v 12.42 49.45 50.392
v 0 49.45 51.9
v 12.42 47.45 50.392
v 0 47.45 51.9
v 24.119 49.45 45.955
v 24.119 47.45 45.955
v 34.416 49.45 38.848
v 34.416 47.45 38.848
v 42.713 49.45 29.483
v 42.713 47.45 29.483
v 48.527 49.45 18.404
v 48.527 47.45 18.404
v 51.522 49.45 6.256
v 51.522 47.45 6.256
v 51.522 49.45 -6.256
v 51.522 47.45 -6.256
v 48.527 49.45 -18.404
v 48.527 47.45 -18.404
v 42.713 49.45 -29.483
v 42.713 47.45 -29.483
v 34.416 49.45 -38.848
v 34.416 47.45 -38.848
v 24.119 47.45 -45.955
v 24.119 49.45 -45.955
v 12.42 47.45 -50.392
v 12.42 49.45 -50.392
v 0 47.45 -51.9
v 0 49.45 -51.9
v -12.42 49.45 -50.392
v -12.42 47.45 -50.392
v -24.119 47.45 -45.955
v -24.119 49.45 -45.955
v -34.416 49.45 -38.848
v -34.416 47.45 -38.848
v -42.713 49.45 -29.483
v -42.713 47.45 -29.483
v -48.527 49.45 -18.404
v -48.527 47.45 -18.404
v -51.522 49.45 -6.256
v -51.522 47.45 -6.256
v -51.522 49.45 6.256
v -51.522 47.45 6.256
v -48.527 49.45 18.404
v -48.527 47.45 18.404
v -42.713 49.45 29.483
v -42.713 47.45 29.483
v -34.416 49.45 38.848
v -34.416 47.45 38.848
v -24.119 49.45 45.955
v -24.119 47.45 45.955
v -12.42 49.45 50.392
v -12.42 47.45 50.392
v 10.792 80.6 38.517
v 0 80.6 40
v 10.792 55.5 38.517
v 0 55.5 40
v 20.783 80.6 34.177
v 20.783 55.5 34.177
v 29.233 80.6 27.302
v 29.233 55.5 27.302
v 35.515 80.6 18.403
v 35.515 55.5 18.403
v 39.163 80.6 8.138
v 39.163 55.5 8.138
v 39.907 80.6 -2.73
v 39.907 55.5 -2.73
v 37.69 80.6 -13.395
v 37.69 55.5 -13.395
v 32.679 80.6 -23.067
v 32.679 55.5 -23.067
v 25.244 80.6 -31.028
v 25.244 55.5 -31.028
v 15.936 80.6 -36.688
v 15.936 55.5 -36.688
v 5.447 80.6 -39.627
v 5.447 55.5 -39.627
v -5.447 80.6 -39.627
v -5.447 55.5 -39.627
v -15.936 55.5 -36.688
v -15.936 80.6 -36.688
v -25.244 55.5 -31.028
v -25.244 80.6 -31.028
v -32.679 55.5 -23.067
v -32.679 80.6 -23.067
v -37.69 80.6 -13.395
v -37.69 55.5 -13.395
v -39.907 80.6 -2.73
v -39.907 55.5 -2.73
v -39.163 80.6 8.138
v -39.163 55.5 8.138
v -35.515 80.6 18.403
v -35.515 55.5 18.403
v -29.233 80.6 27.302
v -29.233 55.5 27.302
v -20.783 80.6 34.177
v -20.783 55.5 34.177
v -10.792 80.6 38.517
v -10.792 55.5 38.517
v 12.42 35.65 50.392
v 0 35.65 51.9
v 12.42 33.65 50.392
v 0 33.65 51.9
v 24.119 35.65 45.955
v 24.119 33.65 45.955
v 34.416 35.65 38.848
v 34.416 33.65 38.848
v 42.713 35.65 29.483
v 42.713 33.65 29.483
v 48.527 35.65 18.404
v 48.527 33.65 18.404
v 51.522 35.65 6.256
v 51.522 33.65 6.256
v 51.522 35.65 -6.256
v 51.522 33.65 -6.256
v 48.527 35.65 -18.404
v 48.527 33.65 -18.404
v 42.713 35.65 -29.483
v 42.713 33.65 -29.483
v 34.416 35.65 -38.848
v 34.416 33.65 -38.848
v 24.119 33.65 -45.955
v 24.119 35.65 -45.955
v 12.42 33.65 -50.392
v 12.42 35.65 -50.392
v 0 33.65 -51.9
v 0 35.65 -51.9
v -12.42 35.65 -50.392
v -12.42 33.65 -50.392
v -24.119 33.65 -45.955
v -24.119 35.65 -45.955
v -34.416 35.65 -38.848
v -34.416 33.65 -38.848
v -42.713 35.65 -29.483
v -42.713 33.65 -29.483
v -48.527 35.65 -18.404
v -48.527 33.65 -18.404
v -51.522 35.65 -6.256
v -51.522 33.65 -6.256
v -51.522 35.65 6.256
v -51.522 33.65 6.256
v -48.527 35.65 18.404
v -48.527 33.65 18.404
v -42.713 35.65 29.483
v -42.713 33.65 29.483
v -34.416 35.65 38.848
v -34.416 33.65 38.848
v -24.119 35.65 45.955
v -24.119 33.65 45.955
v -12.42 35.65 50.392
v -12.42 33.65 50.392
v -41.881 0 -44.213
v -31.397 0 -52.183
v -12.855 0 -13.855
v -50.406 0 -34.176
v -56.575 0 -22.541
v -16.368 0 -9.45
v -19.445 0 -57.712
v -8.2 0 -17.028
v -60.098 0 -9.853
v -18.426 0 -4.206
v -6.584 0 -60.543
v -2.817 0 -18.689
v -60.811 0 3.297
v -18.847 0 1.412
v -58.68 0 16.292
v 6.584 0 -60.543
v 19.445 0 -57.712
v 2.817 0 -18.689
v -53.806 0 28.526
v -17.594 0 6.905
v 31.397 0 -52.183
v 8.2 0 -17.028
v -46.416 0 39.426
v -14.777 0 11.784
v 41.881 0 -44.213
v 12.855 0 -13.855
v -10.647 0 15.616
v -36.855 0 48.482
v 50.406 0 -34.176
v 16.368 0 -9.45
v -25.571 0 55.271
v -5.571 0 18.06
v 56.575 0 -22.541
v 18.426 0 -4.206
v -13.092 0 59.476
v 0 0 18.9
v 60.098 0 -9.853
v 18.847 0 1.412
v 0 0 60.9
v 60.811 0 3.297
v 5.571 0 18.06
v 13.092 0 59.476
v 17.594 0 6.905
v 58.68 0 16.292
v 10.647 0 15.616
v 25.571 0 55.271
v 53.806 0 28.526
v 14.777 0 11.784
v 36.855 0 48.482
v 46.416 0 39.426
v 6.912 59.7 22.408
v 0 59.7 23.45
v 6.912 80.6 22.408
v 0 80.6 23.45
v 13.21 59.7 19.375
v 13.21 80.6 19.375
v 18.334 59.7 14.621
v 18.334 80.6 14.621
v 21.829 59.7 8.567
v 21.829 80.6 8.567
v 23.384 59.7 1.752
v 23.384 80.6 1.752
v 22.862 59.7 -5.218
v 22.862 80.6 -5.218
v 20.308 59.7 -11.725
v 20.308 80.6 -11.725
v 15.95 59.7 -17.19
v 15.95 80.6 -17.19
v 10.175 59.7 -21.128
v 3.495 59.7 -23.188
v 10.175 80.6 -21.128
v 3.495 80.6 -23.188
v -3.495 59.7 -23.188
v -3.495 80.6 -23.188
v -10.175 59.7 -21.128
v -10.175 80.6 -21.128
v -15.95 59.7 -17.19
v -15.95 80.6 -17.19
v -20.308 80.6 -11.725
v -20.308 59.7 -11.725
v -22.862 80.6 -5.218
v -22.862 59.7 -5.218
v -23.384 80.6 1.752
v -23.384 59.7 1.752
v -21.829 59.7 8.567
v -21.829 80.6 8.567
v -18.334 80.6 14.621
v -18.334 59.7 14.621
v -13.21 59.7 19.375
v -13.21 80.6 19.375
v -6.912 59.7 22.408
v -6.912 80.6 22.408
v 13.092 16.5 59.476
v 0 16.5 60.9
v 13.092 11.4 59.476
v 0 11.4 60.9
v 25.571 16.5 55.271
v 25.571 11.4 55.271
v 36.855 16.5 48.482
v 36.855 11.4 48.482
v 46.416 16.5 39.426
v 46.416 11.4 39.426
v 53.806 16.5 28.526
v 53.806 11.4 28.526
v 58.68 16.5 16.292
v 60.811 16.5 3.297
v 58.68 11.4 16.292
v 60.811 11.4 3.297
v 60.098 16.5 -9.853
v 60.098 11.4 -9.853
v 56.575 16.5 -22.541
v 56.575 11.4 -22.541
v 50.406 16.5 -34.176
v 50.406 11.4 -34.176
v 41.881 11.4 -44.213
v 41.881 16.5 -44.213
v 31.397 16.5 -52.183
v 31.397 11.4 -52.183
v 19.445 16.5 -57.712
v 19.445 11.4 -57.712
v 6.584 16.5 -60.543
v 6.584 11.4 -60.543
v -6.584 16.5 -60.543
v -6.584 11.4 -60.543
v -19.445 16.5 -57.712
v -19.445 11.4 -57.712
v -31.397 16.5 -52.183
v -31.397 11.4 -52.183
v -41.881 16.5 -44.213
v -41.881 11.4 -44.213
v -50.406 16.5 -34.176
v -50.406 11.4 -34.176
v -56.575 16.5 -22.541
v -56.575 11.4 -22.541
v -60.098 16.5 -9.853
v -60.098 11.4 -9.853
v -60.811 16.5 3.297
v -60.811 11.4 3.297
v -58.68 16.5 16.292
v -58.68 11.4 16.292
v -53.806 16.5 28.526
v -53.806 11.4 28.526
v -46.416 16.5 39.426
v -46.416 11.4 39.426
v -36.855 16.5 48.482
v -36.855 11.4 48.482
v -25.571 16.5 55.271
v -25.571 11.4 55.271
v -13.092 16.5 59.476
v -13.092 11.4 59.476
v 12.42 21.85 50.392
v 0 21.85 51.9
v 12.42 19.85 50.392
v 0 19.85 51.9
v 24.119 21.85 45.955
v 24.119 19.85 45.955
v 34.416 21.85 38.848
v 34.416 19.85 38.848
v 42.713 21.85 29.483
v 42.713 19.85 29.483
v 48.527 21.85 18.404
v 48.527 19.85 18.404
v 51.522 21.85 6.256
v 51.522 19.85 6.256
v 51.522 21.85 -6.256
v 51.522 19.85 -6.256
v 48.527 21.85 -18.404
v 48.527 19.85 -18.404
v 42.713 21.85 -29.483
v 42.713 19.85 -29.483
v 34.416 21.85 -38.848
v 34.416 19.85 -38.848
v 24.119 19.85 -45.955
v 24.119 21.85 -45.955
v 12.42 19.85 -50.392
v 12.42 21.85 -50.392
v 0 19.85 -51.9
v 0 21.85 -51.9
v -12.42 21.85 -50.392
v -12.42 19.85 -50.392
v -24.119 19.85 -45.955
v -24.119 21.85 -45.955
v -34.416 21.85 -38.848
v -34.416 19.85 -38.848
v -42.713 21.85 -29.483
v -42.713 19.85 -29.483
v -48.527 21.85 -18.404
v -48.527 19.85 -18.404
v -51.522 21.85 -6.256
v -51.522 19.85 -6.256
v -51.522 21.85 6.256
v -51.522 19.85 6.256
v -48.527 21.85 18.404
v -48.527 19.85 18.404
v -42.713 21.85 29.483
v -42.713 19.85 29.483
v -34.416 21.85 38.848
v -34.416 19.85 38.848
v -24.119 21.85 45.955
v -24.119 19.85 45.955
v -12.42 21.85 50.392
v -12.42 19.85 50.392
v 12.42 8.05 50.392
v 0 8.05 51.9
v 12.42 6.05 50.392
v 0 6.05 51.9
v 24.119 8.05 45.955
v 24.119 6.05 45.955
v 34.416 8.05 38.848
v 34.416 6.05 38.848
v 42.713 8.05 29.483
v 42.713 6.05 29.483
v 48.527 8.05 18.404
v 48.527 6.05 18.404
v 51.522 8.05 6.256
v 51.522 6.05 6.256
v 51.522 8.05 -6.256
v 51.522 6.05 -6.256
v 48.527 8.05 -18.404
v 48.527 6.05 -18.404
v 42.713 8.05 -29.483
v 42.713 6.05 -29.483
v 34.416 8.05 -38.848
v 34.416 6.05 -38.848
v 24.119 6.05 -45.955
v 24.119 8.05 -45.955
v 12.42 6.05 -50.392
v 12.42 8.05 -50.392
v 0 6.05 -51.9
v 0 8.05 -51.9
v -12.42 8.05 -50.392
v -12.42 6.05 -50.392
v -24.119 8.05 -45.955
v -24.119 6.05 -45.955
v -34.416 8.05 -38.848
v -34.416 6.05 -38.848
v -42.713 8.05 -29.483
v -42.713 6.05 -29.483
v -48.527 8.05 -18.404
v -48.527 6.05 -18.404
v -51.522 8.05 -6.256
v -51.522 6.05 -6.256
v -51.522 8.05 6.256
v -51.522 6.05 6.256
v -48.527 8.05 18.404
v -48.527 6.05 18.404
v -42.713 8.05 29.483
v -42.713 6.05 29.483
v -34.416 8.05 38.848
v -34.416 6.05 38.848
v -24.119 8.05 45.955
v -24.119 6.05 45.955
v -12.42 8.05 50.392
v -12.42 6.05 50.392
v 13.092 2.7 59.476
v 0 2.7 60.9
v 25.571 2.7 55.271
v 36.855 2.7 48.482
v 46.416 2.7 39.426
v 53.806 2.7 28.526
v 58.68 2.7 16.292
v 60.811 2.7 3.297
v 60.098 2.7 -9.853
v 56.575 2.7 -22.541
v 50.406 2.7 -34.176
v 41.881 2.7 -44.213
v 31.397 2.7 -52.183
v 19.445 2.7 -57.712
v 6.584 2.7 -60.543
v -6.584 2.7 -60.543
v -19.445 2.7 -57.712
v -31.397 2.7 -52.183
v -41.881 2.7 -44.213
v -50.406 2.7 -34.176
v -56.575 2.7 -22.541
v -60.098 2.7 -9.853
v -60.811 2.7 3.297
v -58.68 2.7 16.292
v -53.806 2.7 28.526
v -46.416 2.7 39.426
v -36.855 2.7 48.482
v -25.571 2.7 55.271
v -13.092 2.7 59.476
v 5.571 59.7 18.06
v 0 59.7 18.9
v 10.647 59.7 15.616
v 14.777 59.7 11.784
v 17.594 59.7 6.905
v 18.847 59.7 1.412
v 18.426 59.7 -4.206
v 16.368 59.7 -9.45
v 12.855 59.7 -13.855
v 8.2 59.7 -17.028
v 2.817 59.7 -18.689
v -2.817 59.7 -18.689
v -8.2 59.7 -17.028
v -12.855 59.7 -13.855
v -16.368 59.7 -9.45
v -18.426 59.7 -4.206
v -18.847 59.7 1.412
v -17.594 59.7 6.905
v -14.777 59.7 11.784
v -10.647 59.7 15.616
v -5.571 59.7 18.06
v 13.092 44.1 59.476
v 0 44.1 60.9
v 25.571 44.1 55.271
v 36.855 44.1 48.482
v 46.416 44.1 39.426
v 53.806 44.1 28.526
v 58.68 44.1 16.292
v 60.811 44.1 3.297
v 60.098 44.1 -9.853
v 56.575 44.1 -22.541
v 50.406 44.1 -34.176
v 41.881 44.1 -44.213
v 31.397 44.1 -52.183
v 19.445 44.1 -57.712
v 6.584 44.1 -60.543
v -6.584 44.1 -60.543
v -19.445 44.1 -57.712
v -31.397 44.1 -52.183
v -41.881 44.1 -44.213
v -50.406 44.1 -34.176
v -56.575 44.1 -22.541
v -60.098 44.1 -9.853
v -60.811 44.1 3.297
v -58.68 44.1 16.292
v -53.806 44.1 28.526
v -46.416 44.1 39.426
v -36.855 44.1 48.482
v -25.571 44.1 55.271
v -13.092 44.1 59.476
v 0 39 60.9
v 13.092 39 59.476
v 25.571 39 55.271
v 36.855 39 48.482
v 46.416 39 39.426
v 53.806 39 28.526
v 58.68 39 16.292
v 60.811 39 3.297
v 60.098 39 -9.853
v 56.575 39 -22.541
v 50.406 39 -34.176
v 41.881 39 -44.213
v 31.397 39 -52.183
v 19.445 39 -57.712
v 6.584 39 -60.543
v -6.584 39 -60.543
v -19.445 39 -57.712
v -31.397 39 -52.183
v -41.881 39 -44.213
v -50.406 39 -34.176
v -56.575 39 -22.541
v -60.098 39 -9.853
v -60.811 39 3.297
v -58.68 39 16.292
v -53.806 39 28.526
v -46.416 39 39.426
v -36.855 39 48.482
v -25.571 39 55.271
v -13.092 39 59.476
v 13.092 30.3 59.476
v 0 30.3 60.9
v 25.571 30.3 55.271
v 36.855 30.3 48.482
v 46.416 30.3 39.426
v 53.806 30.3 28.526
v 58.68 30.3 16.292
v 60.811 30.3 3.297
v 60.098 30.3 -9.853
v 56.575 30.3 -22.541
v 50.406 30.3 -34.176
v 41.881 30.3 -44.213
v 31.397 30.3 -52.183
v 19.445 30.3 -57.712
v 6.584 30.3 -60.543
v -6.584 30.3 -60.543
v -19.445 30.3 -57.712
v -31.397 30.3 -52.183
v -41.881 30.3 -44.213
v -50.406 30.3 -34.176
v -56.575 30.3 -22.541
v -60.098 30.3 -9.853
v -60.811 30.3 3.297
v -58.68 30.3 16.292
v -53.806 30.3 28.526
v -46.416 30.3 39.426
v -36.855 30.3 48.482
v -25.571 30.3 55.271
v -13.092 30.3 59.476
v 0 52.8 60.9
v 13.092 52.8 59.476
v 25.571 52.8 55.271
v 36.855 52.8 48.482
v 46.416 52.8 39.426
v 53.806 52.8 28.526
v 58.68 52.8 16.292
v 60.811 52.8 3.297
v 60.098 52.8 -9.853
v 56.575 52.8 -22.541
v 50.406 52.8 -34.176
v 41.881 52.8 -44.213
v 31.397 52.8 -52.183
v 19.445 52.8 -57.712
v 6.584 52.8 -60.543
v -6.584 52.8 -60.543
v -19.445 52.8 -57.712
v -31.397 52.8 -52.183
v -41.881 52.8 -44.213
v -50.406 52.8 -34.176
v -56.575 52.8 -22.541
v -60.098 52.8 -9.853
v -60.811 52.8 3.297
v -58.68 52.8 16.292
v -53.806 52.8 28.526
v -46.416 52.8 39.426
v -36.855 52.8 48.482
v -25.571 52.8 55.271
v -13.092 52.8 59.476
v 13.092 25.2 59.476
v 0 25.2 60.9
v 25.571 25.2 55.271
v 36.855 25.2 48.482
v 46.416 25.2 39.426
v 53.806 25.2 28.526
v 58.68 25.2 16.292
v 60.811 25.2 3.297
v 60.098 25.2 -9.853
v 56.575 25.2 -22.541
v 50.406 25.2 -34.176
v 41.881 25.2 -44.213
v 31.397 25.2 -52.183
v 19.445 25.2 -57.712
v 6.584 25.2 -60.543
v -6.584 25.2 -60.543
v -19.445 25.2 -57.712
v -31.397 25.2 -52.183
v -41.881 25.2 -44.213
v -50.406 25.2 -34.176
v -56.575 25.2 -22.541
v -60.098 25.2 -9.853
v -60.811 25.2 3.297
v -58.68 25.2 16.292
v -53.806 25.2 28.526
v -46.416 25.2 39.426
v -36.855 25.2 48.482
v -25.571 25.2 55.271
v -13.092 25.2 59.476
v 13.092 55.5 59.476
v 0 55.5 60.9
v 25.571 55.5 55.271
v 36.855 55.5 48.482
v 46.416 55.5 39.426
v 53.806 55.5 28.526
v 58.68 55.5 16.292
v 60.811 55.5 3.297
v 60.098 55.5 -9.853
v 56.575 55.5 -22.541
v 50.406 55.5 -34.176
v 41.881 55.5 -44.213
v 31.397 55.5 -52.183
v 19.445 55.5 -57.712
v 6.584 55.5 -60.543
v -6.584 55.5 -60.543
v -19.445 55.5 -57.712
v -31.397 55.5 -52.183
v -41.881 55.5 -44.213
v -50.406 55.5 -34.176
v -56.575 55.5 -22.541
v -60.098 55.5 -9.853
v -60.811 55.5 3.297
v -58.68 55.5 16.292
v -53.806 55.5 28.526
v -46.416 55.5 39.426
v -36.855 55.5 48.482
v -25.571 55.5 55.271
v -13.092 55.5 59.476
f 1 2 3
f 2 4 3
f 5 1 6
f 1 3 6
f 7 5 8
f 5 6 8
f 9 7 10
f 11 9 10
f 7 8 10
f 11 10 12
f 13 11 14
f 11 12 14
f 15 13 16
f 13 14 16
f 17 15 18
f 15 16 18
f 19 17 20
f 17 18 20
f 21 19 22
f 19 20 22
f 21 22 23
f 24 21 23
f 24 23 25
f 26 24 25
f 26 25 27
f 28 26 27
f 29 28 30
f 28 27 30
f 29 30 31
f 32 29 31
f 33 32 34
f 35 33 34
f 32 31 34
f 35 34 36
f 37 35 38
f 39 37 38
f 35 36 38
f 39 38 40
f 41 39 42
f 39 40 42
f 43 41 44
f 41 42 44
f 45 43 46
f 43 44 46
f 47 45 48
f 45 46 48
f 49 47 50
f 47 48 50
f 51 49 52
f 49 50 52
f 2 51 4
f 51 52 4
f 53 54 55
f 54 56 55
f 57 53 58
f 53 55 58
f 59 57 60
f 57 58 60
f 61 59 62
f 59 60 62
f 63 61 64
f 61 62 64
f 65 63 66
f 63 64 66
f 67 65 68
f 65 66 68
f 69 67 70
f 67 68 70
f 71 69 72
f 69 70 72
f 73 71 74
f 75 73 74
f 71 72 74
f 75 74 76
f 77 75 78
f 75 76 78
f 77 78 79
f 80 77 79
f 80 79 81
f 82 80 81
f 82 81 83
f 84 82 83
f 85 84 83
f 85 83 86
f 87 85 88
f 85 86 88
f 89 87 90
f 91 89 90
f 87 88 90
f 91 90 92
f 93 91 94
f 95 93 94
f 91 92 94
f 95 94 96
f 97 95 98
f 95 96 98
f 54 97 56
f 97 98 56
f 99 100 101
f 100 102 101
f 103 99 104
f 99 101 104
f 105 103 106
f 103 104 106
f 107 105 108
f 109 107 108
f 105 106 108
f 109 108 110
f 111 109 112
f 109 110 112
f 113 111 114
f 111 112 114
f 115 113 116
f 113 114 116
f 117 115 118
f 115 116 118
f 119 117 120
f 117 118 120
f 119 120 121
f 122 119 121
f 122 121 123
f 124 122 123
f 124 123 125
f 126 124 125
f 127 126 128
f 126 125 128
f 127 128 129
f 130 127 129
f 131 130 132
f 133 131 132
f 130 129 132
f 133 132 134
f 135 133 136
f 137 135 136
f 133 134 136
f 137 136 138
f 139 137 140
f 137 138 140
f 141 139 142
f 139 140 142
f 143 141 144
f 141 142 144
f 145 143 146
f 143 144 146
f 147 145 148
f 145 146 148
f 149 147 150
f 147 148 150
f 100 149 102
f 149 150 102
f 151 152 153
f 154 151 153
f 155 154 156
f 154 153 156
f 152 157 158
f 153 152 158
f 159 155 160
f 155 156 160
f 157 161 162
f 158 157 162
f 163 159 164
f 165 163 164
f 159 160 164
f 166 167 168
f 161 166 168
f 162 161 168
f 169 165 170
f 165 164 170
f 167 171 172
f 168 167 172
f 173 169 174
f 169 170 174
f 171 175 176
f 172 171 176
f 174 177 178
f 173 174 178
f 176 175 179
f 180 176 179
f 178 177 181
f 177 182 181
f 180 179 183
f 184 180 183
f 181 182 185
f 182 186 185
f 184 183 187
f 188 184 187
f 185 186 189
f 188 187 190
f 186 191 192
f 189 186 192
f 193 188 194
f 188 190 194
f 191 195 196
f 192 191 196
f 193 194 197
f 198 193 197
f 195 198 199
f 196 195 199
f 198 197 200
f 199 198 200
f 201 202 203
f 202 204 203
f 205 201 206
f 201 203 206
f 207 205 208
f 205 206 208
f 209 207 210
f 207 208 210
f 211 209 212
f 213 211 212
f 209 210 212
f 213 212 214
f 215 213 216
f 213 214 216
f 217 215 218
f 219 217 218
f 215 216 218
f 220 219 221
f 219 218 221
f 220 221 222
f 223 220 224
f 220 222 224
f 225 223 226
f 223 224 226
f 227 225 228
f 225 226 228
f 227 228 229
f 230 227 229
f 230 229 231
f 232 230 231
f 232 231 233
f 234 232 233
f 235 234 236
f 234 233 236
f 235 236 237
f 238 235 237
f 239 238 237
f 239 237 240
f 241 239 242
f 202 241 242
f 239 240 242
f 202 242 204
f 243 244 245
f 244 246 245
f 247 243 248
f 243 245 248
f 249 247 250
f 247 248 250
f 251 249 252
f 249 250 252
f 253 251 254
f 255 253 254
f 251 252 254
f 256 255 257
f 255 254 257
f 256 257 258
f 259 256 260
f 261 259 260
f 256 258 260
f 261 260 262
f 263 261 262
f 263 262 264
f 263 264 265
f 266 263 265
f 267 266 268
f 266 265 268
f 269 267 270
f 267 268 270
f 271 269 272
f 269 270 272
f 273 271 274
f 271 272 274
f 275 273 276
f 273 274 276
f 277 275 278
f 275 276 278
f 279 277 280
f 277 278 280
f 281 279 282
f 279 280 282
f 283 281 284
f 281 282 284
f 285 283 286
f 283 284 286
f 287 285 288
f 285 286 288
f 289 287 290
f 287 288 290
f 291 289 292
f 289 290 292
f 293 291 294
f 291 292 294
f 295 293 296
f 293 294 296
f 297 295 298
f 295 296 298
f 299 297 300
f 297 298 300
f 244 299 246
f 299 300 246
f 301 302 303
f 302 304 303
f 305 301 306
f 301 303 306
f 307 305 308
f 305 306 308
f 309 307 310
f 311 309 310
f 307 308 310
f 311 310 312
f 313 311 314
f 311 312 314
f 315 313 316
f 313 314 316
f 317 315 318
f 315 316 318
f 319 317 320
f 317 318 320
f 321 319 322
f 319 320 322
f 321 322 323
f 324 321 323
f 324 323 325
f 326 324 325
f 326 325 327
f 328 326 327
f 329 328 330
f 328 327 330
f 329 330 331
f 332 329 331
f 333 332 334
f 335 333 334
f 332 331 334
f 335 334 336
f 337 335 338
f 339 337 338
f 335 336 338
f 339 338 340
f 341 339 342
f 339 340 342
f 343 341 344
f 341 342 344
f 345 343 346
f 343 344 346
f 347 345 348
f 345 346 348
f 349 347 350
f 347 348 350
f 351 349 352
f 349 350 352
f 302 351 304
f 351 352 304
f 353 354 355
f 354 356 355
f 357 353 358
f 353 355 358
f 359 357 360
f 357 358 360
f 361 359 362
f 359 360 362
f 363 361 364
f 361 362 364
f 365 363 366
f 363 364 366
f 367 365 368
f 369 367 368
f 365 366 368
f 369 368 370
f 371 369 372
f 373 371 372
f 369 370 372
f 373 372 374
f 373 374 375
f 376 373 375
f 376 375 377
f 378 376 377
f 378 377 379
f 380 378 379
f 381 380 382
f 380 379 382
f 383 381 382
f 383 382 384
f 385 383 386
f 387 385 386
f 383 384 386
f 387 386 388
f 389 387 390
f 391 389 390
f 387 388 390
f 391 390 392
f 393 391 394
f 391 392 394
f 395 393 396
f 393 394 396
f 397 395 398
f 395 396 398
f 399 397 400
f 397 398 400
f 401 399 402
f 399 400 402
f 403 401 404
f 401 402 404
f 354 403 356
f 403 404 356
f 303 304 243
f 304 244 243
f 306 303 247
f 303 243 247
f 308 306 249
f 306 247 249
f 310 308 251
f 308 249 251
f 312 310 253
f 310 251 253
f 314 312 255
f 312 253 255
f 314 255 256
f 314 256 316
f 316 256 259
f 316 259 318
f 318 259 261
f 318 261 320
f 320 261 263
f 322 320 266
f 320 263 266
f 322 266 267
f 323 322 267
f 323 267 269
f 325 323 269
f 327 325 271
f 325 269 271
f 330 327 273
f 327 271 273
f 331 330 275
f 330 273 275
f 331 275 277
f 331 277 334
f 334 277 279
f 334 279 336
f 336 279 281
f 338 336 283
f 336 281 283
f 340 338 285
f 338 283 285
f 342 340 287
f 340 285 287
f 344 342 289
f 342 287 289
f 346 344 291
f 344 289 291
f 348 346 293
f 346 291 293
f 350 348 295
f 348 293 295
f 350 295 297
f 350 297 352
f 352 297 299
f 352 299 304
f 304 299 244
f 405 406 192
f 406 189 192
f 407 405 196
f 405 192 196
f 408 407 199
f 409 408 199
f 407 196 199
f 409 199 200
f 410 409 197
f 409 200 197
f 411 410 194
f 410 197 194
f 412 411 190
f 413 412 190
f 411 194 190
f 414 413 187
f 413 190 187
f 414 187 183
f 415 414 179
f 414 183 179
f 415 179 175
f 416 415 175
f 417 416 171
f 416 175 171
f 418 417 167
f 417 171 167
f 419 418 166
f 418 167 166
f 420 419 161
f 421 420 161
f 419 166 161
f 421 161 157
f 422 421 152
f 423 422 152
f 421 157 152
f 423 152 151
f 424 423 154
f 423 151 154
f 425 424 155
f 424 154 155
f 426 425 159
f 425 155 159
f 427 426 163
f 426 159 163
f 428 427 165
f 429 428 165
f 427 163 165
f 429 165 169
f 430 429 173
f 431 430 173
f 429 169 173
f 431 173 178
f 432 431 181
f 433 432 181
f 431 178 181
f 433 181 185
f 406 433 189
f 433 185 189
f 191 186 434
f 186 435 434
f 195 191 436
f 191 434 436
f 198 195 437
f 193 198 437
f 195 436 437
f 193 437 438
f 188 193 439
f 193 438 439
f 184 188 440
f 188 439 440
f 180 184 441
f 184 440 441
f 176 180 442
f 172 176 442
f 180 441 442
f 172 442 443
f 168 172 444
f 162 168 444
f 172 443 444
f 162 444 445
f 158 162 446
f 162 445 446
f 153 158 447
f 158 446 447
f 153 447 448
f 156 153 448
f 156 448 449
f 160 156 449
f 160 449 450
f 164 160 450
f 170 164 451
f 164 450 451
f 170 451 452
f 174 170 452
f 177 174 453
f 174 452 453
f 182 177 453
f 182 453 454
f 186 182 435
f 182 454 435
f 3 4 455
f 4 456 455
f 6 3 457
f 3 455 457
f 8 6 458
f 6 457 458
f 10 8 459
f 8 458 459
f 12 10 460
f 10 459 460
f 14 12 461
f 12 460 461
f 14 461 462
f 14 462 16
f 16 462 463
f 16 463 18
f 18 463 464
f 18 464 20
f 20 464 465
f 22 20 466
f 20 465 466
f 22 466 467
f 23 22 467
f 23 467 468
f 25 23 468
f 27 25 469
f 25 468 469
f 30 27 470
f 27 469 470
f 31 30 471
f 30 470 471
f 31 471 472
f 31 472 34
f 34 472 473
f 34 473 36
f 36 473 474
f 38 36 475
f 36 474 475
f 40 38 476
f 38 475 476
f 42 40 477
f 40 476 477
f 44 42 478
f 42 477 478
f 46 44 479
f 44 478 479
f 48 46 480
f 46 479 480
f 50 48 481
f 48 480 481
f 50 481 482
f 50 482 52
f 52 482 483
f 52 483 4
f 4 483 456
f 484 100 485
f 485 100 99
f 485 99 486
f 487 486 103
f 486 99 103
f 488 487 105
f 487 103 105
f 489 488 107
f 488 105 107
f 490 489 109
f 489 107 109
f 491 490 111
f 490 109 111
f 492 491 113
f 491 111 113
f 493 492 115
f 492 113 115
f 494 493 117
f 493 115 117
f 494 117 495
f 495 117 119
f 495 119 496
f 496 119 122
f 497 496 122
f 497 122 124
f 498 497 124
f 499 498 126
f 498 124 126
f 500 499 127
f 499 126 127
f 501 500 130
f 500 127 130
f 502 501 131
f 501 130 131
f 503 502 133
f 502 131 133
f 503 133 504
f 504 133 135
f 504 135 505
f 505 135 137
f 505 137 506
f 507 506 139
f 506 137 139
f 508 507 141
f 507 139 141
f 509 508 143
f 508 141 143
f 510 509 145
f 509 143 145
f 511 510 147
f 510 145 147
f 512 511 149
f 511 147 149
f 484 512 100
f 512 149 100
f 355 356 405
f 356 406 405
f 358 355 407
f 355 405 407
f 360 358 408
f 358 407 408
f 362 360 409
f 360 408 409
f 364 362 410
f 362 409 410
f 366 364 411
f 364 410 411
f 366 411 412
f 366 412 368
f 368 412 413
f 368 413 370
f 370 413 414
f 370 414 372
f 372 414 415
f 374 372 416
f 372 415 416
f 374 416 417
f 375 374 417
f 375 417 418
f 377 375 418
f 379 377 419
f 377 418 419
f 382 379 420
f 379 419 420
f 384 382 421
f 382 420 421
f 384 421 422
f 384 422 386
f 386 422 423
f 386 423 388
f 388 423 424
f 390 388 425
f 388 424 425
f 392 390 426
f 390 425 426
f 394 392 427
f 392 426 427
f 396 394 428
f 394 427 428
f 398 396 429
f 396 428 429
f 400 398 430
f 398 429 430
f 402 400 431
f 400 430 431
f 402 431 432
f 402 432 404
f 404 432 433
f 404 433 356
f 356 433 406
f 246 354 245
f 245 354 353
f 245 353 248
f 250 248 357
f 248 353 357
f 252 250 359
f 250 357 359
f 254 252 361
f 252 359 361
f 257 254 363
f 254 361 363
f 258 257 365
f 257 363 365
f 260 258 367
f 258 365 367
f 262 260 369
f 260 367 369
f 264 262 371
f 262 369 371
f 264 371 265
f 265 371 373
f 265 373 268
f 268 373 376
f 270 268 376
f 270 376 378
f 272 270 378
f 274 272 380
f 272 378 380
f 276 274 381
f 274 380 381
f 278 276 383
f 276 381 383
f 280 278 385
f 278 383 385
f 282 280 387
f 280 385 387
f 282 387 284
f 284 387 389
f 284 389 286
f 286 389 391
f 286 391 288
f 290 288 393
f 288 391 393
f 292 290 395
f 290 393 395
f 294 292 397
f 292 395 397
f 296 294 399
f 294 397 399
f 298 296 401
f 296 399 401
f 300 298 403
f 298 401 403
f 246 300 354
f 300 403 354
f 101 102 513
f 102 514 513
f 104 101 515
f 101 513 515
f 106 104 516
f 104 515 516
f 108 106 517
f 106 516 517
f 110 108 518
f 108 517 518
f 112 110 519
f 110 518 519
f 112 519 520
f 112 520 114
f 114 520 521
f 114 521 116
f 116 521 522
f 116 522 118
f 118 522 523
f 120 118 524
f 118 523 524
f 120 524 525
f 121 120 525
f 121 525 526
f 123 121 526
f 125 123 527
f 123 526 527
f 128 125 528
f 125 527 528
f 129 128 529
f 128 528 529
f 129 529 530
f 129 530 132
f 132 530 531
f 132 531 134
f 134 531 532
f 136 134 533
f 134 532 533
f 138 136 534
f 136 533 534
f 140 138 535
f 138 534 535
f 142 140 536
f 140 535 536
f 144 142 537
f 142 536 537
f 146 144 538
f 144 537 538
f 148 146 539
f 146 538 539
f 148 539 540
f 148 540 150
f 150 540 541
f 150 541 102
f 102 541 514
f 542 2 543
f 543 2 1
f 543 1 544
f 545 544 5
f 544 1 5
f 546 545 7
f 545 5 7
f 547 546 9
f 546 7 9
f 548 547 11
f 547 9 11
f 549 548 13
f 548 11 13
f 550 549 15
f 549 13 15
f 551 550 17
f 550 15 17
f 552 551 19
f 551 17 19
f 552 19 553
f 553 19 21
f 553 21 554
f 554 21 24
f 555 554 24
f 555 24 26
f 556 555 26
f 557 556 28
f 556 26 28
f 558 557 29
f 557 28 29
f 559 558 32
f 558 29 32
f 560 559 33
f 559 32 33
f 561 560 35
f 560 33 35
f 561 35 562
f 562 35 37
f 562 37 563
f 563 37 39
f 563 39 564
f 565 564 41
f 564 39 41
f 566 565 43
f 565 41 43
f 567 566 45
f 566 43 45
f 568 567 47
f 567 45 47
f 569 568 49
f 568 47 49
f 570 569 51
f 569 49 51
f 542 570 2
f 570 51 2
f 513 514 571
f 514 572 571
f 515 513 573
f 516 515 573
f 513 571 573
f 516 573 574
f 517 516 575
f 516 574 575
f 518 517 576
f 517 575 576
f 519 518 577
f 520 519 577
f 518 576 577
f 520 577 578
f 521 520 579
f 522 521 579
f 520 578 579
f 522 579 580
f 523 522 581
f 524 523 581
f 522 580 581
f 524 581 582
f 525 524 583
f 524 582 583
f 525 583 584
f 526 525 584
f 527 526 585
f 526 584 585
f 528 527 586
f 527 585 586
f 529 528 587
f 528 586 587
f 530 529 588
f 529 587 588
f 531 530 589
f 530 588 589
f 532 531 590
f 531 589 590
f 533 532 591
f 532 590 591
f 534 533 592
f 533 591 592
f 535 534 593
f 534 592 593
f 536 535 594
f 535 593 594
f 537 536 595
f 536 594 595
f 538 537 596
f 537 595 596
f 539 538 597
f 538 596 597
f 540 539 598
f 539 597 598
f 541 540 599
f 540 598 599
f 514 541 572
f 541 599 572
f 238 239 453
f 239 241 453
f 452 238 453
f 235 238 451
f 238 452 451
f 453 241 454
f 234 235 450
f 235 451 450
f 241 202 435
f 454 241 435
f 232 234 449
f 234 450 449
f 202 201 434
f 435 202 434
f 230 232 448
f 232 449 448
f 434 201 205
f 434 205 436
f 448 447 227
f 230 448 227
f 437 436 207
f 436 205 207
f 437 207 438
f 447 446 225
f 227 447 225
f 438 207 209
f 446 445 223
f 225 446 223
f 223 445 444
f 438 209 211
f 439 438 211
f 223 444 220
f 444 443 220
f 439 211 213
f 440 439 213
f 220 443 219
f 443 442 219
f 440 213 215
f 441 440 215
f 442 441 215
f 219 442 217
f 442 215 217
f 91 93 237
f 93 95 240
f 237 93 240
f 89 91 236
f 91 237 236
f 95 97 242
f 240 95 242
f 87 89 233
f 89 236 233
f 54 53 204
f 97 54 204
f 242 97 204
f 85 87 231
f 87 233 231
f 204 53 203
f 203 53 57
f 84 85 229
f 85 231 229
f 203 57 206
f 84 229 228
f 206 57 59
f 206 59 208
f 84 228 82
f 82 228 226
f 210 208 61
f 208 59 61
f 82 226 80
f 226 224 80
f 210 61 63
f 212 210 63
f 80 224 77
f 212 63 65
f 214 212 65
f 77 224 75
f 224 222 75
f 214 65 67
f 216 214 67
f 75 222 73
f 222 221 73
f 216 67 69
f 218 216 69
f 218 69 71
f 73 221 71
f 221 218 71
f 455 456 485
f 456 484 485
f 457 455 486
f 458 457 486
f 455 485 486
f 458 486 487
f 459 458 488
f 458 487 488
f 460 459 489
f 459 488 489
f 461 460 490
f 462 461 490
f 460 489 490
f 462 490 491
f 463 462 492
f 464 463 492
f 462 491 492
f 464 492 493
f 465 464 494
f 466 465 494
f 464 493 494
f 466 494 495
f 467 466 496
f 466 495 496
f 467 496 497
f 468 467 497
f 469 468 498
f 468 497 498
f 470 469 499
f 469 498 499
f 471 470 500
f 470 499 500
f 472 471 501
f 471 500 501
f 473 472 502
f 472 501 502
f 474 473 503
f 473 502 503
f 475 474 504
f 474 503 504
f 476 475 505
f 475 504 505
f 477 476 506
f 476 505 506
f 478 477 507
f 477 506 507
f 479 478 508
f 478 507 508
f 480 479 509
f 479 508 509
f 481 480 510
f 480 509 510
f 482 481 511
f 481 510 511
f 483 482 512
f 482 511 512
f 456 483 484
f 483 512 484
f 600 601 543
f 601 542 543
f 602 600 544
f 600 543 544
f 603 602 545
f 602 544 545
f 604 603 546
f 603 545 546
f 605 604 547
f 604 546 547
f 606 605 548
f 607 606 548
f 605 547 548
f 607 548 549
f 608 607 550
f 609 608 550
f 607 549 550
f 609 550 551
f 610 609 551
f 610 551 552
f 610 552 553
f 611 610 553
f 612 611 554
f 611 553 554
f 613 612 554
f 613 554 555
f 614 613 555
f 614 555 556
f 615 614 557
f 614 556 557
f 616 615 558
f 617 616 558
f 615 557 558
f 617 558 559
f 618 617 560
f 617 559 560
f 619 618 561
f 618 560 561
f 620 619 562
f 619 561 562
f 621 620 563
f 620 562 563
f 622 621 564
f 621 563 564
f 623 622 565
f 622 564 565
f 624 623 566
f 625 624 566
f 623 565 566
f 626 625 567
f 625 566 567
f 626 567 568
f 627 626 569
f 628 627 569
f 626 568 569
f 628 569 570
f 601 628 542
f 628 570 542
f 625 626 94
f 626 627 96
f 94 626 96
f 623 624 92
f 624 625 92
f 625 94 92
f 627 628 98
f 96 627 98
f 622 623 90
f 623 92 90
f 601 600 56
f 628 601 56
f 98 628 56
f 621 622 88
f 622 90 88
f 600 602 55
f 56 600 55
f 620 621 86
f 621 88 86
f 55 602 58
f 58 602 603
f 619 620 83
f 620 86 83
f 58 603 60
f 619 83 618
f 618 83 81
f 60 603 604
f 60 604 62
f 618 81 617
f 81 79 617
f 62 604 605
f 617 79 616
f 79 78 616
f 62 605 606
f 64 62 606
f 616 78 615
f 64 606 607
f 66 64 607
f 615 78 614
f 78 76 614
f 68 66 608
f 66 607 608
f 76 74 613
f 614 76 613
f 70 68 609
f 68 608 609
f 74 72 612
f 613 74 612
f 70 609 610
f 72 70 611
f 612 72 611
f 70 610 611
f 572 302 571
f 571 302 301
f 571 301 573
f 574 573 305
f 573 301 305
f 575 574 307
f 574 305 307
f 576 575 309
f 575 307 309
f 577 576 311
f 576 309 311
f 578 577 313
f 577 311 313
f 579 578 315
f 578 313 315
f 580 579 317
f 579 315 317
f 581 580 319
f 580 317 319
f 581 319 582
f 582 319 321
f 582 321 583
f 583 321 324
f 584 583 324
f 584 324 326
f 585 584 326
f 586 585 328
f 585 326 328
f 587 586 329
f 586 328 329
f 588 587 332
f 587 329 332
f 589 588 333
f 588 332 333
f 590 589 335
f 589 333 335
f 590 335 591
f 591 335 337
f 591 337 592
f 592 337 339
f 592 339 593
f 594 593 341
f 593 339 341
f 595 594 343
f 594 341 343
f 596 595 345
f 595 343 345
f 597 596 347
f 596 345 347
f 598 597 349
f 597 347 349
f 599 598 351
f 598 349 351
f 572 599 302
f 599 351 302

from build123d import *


with BuildPart() as f1:
    # F0 (on Right) → F1 (revolve)
    with BuildSketch(Plane.YZ):
        Polygon((0, 60.9), (0, 18.9), (59.7, 18.9), (59.7, 23.45), (80.6, 23.45), (80.6, 40), (55.5, 40), (55.5, 60.9), (52.8, 60.9), (49.45, 51.9), (47.45, 51.9), (44.1, 60.9), (39, 60.9), (35.65, 51.9), (33.65, 51.9), (30.3, 60.9), (25.2, 60.9), (21.85, 51.9), (19.85, 51.9), (16.5, 60.9), (11.4, 60.9), (8.05, 51.9), (6.05, 51.9), (2.7, 60.9), align=None)
    revolve(axis=Axis((0, 40.3, 0), (0, 1, 0)))


solid = f1.part
